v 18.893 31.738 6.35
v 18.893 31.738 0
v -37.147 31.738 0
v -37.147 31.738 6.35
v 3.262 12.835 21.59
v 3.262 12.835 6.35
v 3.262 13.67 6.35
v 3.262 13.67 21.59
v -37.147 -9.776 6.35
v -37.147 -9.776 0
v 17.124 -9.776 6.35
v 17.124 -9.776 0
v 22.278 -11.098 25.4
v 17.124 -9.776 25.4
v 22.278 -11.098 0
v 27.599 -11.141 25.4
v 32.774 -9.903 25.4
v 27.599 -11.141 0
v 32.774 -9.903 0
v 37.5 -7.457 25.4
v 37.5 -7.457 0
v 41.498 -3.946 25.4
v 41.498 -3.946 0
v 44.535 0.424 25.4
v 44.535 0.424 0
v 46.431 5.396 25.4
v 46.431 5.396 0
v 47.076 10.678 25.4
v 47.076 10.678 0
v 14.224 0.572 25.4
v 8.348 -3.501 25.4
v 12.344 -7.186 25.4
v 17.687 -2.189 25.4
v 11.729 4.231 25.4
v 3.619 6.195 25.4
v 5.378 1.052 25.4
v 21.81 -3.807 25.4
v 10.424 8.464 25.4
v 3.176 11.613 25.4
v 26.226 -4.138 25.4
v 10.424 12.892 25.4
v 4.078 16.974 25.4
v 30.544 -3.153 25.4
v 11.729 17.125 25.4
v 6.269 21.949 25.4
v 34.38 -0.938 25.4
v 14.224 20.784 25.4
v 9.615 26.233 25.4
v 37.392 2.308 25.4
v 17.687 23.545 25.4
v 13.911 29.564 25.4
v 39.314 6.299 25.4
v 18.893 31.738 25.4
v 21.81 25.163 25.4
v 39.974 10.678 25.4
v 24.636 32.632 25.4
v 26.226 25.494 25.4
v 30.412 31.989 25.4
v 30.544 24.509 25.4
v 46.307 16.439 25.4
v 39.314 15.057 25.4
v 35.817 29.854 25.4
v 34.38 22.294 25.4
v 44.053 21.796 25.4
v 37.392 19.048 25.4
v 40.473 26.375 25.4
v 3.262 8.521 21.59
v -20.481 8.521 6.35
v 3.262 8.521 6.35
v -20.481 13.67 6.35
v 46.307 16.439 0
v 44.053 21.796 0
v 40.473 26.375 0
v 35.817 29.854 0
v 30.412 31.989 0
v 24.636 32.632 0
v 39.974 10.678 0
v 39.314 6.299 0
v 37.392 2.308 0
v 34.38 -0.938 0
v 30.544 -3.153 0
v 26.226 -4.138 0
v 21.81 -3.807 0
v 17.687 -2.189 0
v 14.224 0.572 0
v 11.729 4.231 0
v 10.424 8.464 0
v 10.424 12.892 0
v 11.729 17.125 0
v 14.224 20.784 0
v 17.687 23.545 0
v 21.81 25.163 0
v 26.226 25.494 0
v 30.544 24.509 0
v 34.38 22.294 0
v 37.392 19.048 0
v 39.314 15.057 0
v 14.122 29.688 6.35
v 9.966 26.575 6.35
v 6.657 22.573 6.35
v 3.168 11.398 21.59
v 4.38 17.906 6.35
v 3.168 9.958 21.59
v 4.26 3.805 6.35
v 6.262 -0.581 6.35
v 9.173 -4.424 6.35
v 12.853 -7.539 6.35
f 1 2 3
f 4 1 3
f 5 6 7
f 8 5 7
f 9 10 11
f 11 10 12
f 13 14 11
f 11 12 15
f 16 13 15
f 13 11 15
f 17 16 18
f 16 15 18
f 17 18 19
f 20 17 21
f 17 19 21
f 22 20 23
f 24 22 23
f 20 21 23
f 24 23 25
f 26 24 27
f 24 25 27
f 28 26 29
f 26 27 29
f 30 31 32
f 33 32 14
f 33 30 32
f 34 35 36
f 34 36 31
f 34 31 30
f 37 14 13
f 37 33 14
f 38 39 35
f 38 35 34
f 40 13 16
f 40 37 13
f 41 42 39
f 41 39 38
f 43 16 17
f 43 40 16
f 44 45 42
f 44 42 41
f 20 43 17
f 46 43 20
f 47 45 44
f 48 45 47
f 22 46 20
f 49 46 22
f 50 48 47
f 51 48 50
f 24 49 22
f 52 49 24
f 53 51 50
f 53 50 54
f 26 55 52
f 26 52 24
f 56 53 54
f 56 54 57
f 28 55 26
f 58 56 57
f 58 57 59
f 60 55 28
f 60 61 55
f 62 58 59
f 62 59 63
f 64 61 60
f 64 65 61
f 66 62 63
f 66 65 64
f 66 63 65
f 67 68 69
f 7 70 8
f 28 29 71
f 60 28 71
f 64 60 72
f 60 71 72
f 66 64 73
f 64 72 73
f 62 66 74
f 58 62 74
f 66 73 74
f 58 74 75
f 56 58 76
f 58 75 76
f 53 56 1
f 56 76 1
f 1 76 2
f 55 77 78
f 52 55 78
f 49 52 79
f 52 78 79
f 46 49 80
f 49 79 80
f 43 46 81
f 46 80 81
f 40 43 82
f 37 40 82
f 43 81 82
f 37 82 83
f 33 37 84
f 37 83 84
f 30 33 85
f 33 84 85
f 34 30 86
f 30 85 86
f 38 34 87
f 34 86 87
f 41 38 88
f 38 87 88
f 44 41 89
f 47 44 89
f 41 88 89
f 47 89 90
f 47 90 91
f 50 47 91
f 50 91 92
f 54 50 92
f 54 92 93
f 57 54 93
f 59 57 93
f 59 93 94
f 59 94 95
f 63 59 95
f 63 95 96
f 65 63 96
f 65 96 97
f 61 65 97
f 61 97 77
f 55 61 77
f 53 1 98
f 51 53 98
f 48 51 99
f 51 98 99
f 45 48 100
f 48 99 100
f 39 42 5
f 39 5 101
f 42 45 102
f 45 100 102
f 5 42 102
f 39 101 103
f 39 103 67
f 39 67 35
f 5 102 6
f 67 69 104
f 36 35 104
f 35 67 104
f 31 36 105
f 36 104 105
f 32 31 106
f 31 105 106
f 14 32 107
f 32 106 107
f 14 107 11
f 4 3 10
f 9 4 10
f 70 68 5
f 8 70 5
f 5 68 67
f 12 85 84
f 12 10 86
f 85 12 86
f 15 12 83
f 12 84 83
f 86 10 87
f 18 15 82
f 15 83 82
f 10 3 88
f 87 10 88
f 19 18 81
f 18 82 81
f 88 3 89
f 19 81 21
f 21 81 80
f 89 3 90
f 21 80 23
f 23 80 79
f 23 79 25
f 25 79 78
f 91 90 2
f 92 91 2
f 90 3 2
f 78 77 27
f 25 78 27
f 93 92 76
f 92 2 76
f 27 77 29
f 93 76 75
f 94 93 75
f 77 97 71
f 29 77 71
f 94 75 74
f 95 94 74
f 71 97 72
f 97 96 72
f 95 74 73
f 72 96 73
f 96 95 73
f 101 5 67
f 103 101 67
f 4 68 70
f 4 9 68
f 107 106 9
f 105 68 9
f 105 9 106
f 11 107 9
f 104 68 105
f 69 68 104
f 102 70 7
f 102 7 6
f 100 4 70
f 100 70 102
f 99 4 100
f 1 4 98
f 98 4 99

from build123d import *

# Parameters (mm, degrees)
F1_DEPTH = 25.4
F2_DEPTH = 6.35
F3_W     = 23.7435890902
F3_H     = 5.1485070969
F4_DEPTH = 15.24
F6_DEPTH = 25.4


with BuildPart() as f1:
    # F0 (on Top) → F1 (new body)
    with BuildSketch(Plane.XY):
        with BuildLine():
            Line((18.8931578837, 24.1700439467), (18.8931578837, 31.7375900053))
            ThreePointArc((18.8931578837, 31.7375900053), (3.1761509097, 11.6131597759), (17.1237481406, -9.7756581381))
            Line((17.1237481406, -9.7756581381), (18.8931578837, -9.7756581381))
            Line((18.8931578837, -9.7756581381), (18.8931578837, -2.813992159))
            ThreePointArc((18.8931578837, -2.813992159), (10.25801694, 10.6780258939), (18.8931578837, 24.1700439467))
        make_face()
        with BuildLine():
            ThreePointArc((17.1237481406, -9.7756581381), (37.4998302695, -7.4566605731), (47.0756132336, 10.6780258939))
            ThreePointArc((47.0756132336, 10.6780258939), (38.2608461116, 28.2689044259), (18.8931578837, 31.7375900053))
            Line((18.8931578837, 31.7375900053), (18.8931578837, 24.1700439467))
            ThreePointArc((18.8931578837, 24.1700439467), (33.1252948881, 23.1923094524), (39.9738272468, 10.6780258939))
            ThreePointArc((39.9738272468, 10.6780258939), (33.1252948881, -1.8362576647), (18.8931578837, -2.813992159))
            Line((18.8931578837, -2.813992159), (18.8931578837, -9.7756581381))
            Line((18.8931578837, -9.7756581381), (17.1237481406, -9.7756581381))
        make_face()
    extrude(amount=F1_DEPTH)

    # F0 (on Top) → F2 (join)
    with BuildSketch(Plane.XY):
        with BuildLine():
            ThreePointArc((17.1237481406, -9.7756581381), (37.4998302695, -7.4566605731), (47.0756132336, 10.6780258939))
            ThreePointArc((47.0756132336, 10.6780258939), (38.2608461116, 28.2689044259), (18.8931578837, 31.7375900053))
            Line((18.8931578837, 31.7375900053), (18.8931578837, 24.1700439467))
            ThreePointArc((18.8931578837, 24.1700439467), (33.1252948881, 23.1923094524), (39.9738272468, 10.6780258939))
            ThreePointArc((39.9738272468, 10.6780258939), (33.1252948881, -1.8362576647), (18.8931578837, -2.813992159))
            Line((18.8931578837, -2.813992159), (18.8931578837, -9.7756581381))
            Line((18.8931578837, -9.7756581381), (17.1237481406, -9.7756581381))
        make_face()
        with BuildLine():
            Line((18.8931578837, 24.1700439467), (18.8931578837, 31.7375900053))
            ThreePointArc((18.8931578837, 31.7375900053), (3.1761509097, 11.6131597759), (17.1237481406, -9.7756581381))
            Line((17.1237481406, -9.7756581381), (18.8931578837, -9.7756581381))
            Line((18.8931578837, -9.7756581381), (18.8931578837, -2.813992159))
            ThreePointArc((18.8931578837, -2.813992159), (10.25801694, 10.6780258939), (18.8931578837, 24.1700439467))
        make_face()
        with BuildLine():
            ThreePointArc((17.1237481406, -9.7756581381), (3.1761509097, 11.6131597759), (18.8931578837, 31.7375900053))
            Line((18.8931578837, 31.7375900053), (-37.1474996209, 31.7375900053))
            Line((-37.1474996209, 31.7375900053), (-37.1474996209, -9.7756581381))
            Line((-37.1474996209, -9.7756581381), (17.1237481406, -9.7756581381))
        make_face()
    extrude(amount=F2_DEPTH)

    # F3 (on face) → F4 (join)
    with BuildSketch(Plane.XY.offset(6.35)):
        with Locations((-8.6094063437, 11.0956405284)):
            Rectangle(F3_W, F3_H)
    extrude(amount=F4_DEPTH)

    # F5 (on face) → F6 (cut)
    with BuildSketch(Plane.XZ.offset(-8.52138698)):
        Polygon((-20.4812008888, 6.35), (3.2623882014, 21.59), (-20.4812008888, 21.59), align=None)
    extrude(amount=-F6_DEPTH, mode=Mode.SUBTRACT)


solid = f1.part
